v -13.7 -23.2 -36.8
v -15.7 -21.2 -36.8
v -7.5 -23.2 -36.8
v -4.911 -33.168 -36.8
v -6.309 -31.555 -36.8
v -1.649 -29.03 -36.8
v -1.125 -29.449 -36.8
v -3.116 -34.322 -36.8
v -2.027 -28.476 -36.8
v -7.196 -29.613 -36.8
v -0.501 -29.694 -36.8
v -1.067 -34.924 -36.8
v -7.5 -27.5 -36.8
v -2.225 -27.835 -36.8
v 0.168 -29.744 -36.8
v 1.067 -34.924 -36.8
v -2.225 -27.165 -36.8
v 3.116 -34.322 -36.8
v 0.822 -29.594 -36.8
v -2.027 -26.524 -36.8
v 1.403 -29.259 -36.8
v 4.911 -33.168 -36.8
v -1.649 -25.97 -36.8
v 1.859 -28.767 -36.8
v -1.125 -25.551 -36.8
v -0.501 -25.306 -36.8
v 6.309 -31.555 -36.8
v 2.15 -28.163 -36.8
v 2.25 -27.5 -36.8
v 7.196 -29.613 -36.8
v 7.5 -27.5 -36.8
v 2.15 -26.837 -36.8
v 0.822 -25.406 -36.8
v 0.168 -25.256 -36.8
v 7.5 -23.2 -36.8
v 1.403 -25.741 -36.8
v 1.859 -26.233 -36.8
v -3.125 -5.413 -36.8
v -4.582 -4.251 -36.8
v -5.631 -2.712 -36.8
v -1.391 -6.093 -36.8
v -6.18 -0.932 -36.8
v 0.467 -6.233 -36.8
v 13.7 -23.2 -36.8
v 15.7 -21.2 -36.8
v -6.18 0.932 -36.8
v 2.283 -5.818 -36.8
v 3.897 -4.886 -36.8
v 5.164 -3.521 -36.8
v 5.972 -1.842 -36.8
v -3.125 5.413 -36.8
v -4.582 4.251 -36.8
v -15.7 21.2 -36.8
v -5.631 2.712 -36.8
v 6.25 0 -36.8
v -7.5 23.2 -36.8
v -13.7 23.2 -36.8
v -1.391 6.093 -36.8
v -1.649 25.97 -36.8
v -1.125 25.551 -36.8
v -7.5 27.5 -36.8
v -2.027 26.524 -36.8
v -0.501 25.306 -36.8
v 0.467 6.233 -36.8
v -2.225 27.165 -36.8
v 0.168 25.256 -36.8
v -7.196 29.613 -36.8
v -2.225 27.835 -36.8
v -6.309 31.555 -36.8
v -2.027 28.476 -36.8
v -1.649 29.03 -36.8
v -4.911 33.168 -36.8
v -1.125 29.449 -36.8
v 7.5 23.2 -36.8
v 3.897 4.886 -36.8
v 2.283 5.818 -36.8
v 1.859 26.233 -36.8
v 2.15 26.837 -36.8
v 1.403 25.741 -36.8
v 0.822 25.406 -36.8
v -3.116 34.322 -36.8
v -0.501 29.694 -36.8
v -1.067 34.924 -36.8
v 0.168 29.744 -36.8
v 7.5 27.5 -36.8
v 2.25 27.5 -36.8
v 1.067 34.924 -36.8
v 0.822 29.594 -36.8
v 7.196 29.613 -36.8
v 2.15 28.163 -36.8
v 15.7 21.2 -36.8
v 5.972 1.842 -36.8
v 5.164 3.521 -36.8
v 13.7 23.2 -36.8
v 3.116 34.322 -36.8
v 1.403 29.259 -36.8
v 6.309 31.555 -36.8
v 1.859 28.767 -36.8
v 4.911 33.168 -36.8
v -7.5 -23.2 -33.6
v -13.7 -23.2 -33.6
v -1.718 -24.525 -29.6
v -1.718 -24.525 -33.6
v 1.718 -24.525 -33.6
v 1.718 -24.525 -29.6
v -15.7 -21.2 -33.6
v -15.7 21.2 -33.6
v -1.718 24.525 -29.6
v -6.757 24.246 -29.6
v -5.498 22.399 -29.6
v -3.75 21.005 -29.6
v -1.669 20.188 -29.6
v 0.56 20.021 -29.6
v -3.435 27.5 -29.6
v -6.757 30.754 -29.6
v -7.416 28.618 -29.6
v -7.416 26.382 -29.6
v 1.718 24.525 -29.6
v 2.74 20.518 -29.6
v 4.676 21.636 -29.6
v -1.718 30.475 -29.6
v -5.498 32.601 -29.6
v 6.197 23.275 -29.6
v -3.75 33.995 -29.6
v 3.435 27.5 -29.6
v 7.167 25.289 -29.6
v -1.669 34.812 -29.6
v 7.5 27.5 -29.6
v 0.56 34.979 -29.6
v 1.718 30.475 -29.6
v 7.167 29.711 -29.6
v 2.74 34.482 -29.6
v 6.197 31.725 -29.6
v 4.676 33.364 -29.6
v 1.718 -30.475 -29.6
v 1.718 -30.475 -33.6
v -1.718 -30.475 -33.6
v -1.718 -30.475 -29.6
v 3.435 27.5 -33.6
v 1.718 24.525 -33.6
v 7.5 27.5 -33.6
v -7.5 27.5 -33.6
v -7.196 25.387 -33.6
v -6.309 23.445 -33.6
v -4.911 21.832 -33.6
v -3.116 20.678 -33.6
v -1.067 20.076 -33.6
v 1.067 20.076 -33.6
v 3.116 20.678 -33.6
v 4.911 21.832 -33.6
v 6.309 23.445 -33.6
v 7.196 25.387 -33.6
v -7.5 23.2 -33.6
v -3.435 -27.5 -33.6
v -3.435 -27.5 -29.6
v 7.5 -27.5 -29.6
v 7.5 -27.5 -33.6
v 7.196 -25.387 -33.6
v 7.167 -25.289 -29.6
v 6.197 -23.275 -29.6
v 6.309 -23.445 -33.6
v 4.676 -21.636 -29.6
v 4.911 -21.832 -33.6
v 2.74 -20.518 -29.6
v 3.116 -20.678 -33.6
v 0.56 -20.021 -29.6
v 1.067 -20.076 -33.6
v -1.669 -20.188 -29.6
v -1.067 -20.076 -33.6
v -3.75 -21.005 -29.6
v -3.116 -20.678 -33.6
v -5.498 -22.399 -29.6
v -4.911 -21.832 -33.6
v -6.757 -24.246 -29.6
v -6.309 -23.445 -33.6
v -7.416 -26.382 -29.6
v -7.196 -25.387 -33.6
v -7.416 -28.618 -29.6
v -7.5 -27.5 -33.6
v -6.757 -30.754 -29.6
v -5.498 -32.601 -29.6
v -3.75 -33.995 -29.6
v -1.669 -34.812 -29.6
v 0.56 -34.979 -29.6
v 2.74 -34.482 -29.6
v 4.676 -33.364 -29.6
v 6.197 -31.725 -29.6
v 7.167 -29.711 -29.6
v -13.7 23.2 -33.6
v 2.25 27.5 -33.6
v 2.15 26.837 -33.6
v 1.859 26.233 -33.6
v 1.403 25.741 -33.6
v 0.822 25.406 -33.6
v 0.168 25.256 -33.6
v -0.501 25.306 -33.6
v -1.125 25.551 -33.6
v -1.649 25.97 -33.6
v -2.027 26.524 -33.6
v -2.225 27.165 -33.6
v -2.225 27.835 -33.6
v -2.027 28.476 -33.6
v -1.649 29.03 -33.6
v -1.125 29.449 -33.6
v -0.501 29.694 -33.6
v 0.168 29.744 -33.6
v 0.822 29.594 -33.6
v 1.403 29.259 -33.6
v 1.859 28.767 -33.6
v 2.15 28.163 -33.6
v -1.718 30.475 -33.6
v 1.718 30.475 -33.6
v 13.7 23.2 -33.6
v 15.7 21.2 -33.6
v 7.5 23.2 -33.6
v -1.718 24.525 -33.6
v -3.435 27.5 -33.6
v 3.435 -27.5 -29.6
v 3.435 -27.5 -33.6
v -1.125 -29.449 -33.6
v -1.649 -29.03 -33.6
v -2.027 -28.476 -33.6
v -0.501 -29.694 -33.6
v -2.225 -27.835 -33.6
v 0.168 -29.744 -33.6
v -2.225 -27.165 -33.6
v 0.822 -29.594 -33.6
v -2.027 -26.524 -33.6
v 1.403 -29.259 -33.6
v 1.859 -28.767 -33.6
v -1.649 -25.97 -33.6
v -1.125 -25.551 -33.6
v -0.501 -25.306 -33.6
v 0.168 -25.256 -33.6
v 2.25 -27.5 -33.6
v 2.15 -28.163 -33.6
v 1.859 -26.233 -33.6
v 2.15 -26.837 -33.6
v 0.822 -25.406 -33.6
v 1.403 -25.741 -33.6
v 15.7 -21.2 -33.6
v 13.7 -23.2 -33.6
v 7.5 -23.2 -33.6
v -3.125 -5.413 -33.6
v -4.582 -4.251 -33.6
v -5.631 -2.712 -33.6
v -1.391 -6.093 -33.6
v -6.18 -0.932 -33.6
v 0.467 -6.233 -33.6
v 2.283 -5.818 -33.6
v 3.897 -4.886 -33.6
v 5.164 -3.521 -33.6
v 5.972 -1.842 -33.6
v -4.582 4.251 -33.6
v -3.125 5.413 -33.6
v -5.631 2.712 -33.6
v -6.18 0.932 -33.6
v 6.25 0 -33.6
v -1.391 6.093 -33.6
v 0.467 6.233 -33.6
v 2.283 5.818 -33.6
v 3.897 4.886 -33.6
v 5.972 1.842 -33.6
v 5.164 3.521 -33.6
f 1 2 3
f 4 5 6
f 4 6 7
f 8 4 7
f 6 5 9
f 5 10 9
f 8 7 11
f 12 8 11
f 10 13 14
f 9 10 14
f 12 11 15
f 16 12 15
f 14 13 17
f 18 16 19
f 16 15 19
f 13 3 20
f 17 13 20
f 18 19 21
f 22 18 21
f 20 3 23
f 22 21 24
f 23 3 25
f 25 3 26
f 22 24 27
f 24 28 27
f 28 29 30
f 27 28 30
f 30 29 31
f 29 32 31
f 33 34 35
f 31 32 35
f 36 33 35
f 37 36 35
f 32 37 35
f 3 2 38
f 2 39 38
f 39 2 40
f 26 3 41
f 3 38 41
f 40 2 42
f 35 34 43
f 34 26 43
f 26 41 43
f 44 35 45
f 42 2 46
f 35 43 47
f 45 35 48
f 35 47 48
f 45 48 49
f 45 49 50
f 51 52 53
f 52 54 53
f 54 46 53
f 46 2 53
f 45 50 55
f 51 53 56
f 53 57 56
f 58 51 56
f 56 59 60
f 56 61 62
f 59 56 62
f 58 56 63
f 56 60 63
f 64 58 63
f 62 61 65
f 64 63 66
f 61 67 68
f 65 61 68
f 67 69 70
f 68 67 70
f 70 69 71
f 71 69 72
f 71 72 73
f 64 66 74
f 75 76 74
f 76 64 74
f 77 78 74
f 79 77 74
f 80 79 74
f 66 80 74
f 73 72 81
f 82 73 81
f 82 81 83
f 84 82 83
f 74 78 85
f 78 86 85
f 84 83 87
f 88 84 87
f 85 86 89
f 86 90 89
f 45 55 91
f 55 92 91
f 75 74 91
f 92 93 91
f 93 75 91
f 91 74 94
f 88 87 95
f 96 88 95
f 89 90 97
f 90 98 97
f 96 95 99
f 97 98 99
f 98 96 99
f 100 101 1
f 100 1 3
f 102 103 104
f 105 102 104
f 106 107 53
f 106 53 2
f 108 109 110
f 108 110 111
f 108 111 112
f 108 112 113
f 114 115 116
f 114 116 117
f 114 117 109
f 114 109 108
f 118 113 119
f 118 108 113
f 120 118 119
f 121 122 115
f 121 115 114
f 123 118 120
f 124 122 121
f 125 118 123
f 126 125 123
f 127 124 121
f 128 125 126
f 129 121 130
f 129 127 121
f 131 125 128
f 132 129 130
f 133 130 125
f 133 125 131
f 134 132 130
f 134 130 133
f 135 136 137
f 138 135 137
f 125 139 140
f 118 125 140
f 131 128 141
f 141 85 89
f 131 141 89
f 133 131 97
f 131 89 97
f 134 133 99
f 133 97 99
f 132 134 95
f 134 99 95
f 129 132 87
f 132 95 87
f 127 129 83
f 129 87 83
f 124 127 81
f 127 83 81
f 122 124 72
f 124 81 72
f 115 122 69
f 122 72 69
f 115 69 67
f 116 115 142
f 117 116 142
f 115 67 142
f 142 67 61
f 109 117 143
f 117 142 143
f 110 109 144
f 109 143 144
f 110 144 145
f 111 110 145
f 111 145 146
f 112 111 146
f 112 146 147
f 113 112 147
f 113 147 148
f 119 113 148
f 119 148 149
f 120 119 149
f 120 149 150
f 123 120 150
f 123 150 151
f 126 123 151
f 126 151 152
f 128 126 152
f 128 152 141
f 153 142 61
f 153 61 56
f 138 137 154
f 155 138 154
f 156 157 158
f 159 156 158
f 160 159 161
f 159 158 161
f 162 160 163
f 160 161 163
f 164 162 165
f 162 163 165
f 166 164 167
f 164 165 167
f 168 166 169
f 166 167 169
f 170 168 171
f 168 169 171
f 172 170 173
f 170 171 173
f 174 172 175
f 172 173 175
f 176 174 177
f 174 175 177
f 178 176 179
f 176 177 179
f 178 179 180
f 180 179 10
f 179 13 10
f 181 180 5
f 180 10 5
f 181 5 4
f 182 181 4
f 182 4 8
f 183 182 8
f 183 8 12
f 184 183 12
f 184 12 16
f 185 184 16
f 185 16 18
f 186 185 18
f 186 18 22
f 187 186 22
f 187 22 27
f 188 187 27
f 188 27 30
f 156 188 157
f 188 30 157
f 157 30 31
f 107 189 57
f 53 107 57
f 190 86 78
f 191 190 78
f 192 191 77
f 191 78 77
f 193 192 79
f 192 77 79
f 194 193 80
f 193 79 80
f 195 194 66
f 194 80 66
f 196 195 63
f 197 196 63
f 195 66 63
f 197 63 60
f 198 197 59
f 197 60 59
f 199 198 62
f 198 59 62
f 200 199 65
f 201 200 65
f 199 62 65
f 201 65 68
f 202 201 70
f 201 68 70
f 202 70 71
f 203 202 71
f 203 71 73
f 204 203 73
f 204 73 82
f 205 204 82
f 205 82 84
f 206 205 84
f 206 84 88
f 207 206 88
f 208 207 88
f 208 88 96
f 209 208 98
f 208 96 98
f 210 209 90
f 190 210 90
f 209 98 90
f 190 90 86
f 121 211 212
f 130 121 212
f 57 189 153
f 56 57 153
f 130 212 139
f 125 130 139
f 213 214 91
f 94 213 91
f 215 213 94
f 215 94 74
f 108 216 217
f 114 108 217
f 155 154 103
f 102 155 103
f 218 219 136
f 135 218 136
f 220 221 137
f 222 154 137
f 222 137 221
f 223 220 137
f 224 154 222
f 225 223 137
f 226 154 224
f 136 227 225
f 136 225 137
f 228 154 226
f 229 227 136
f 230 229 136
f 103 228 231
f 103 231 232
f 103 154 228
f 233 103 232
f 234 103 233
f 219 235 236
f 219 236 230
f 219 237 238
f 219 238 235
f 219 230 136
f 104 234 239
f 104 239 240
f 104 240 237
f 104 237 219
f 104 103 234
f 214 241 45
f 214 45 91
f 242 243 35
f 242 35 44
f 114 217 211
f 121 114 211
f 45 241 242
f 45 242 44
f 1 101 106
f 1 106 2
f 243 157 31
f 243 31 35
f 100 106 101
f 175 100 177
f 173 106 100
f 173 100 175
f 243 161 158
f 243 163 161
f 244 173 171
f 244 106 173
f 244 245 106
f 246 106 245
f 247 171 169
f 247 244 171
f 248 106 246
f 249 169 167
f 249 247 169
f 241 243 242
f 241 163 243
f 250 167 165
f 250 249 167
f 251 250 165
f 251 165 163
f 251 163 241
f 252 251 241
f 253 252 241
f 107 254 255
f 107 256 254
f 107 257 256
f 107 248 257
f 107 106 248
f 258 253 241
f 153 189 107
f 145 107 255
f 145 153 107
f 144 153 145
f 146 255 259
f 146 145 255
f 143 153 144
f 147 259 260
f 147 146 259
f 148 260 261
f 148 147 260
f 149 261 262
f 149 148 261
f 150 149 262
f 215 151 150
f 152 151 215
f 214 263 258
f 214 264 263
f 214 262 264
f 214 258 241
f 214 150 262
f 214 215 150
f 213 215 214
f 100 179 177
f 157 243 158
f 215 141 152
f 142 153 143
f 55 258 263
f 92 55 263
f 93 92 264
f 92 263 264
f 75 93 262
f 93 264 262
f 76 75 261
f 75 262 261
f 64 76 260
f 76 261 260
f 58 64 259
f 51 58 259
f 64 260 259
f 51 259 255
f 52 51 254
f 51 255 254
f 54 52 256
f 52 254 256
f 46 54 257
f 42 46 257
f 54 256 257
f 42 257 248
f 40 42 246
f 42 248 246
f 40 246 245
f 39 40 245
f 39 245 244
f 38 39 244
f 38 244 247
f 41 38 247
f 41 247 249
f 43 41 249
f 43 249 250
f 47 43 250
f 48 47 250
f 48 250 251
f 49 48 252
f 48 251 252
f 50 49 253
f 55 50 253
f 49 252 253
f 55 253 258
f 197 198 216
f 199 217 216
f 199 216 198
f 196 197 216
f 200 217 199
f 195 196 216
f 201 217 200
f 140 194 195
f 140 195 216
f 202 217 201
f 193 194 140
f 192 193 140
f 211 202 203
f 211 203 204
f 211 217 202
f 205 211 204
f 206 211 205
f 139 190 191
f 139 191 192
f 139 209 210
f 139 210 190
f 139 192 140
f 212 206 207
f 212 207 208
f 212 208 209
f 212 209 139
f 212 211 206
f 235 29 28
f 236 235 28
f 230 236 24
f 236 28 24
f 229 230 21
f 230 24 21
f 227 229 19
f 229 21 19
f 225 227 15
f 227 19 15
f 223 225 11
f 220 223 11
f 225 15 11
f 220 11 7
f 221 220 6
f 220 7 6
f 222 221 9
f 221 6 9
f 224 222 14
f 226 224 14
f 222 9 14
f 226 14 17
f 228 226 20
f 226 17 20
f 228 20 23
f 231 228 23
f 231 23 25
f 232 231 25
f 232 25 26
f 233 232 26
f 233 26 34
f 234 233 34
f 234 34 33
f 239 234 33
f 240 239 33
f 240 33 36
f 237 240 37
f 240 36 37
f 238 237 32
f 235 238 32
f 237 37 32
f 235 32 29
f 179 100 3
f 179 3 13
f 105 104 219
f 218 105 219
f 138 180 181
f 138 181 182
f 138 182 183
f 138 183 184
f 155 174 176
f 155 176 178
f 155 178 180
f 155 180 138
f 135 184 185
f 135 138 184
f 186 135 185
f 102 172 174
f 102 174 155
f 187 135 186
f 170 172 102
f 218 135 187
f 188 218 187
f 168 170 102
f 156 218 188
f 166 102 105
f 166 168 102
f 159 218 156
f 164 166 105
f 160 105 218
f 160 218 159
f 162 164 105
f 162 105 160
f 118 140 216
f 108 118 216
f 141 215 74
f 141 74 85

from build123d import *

# Parameters (mm, degrees)
F0_W      = 25
F0_H      = 40
F0_R      = 6.25
F1_DEPTH  = 3.2
F2_W      = 25
F2_H      = 40
F3_DEPTH  = 40
F4_W      = 15
F4_H      = 46.4
F4_R      = 2.25
F5_DEPTH  = 5
F6_SIZE   = 2
F7_R      = 2.25
F8_DEPTH  = 3.2
F9_W      = 46.4
F9_H      = 70
F10_DEPTH = 36.8
F11_W     = 25
F11_H     = 40
F11_R     = 6.25
F12_DEPTH = 3.2
F13_R     = 7.5
F14_DEPTH = 4


with BuildPart() as f1:
    # F0 (on Top) → F1 (new body)
    with BuildSketch(Plane.XY):
        Rectangle(F0_W, F0_H)
        Circle(F0_R, mode=Mode.SUBTRACT)
    extrude(amount=F1_DEPTH)

    # F2 (on face) → F3 (join)
    with BuildSketch(Plane.XY.offset(3.2)):
        with BuildLine():
            Line((15.7, -23.2), (15.7, 23.2))
            Line((15.7, 23.2), (7.5, 23.2))
            Line((7.5, 23.2), (7.5, 27.5))
            ThreePointArc((7.5, 27.5), (0, 35), (-7.5, 27.5))
            Line((-7.5, 27.5), (-7.5, 23.2))
            Line((-7.5, 23.2), (-15.7, 23.2))
            Line((-15.7, 23.2), (-15.7, -23.2))
            Line((-15.7, -23.2), (-7.5, -23.2))
            Line((-7.5, -23.2), (-7.5, -27.5))
            ThreePointArc((-7.5, -27.5), (0, -35), (7.5, -27.5))
            Line((7.5, -27.5), (7.5, -23.2))
            Line((7.5, -23.2), (15.7, -23.2))
        make_face()
        Polygon((-3.4352341017, -27.5), (-1.7176170508, -24.525), (1.7176170508, -24.525), (3.4352341017, -27.5), (1.7176170508, -30.475), (-1.7176170508, -30.475), align=None, mode=Mode.SUBTRACT)
        Rectangle(F2_W, F2_H, mode=Mode.SUBTRACT)
        Polygon((-3.4352341017, 27.5), (-1.7176170508, 30.475), (1.7176170508, 30.475), (3.4352341017, 27.5), (1.7176170508, 24.525), (-1.7176170508, 24.525), align=None, mode=Mode.SUBTRACT)
    extrude(amount=-F3_DEPTH)

    # F4 (on face) → F5 (join)
    with BuildSketch(Plane.XY.offset(3.2)):
        with Locations((-23.2, 0)):
            Rectangle(F4_W, F4_H)
        with Locations((-23.2, -13.2)):
            Circle(F4_R, mode=Mode.SUBTRACT)
        with Locations((-23.2, 13.2)):
            Circle(F4_R, mode=Mode.SUBTRACT)
    extrude(amount=-F5_DEPTH)

    # F6
    f6_edges = [f1.edges().sort_by_distance(p)[0] for p in [
        (15.7, 23.2, -16.8),
        (-15.7, 23.2, -19.3),
        (-15.7, -23.2, -19.3),
        (15.7, -23.2, -16.8),
        (-30.7, 23.2, 0.7),
        (-30.7, -23.2, 0.7),
    ]]
    chamfer(f6_edges, length=F6_SIZE)

    # F7 (on face) → F8 (join)
    with BuildSketch(Plane(origin=(0, 0, -36.8), x_dir=(1, 0, 0), z_dir=(0, 0, -1))):
        Polygon((1.7176170508, 30.475), (-1.7176170508, 30.475), (-3.4352341017, 27.5), (-1.7176170508, 24.525), (1.7176170508, 24.525), (3.4352341017, 27.5), align=None)
        with Locations((0, 27.5)):
            Circle(F7_R, mode=Mode.SUBTRACT)
        Polygon((-3.4352341017, -27.5), (-1.7176170508, -30.475), (1.7176170508, -30.475), (3.4352341017, -27.5), (1.7176170508, -24.525), (-1.7176170508, -24.525), align=None)
        with Locations((0, -27.5)):
            Circle(F7_R, mode=Mode.SUBTRACT)
    extrude(amount=-F8_DEPTH)

    # F9 (on face) → F10 (cut)
    with BuildSketch(Plane.XY.offset(3.2)):
        with Locations((-7.5, 0)):
            Rectangle(F9_W, F9_H)
    extrude(amount=-F10_DEPTH, mode=Mode.SUBTRACT)

    # F11 (on face) → F12 (join)
    with BuildSketch(Plane.XY.offset(-33.6)):
        Rectangle(F11_W, F11_H)
        Circle(F11_R, mode=Mode.SUBTRACT)
    extrude(amount=-F12_DEPTH)

    # F13 (on face) → F14 (join)
    with BuildSketch(Plane.XY.offset(-33.6)):
        with Locations((0, 27.5)):
            Circle(F13_R)
        Polygon((-3.4352341017, 27.5), (-1.7176170508, 30.475), (1.7176170508, 30.475), (3.4352341017, 27.5), (1.7176170508, 24.525), (-1.7176170508, 24.525), align=None, mode=Mode.SUBTRACT)
        with Locations((0, -27.5)):
            Circle(F13_R)
        Polygon((-3.4352341017, -27.5), (-1.7176170508, -24.525), (1.7176170508, -24.525), (3.4352341017, -27.5), (1.7176170508, -30.475), (-1.7176170508, -30.475), align=None, mode=Mode.SUBTRACT)
    extrude(amount=F14_DEPTH)


solid = f1.part
